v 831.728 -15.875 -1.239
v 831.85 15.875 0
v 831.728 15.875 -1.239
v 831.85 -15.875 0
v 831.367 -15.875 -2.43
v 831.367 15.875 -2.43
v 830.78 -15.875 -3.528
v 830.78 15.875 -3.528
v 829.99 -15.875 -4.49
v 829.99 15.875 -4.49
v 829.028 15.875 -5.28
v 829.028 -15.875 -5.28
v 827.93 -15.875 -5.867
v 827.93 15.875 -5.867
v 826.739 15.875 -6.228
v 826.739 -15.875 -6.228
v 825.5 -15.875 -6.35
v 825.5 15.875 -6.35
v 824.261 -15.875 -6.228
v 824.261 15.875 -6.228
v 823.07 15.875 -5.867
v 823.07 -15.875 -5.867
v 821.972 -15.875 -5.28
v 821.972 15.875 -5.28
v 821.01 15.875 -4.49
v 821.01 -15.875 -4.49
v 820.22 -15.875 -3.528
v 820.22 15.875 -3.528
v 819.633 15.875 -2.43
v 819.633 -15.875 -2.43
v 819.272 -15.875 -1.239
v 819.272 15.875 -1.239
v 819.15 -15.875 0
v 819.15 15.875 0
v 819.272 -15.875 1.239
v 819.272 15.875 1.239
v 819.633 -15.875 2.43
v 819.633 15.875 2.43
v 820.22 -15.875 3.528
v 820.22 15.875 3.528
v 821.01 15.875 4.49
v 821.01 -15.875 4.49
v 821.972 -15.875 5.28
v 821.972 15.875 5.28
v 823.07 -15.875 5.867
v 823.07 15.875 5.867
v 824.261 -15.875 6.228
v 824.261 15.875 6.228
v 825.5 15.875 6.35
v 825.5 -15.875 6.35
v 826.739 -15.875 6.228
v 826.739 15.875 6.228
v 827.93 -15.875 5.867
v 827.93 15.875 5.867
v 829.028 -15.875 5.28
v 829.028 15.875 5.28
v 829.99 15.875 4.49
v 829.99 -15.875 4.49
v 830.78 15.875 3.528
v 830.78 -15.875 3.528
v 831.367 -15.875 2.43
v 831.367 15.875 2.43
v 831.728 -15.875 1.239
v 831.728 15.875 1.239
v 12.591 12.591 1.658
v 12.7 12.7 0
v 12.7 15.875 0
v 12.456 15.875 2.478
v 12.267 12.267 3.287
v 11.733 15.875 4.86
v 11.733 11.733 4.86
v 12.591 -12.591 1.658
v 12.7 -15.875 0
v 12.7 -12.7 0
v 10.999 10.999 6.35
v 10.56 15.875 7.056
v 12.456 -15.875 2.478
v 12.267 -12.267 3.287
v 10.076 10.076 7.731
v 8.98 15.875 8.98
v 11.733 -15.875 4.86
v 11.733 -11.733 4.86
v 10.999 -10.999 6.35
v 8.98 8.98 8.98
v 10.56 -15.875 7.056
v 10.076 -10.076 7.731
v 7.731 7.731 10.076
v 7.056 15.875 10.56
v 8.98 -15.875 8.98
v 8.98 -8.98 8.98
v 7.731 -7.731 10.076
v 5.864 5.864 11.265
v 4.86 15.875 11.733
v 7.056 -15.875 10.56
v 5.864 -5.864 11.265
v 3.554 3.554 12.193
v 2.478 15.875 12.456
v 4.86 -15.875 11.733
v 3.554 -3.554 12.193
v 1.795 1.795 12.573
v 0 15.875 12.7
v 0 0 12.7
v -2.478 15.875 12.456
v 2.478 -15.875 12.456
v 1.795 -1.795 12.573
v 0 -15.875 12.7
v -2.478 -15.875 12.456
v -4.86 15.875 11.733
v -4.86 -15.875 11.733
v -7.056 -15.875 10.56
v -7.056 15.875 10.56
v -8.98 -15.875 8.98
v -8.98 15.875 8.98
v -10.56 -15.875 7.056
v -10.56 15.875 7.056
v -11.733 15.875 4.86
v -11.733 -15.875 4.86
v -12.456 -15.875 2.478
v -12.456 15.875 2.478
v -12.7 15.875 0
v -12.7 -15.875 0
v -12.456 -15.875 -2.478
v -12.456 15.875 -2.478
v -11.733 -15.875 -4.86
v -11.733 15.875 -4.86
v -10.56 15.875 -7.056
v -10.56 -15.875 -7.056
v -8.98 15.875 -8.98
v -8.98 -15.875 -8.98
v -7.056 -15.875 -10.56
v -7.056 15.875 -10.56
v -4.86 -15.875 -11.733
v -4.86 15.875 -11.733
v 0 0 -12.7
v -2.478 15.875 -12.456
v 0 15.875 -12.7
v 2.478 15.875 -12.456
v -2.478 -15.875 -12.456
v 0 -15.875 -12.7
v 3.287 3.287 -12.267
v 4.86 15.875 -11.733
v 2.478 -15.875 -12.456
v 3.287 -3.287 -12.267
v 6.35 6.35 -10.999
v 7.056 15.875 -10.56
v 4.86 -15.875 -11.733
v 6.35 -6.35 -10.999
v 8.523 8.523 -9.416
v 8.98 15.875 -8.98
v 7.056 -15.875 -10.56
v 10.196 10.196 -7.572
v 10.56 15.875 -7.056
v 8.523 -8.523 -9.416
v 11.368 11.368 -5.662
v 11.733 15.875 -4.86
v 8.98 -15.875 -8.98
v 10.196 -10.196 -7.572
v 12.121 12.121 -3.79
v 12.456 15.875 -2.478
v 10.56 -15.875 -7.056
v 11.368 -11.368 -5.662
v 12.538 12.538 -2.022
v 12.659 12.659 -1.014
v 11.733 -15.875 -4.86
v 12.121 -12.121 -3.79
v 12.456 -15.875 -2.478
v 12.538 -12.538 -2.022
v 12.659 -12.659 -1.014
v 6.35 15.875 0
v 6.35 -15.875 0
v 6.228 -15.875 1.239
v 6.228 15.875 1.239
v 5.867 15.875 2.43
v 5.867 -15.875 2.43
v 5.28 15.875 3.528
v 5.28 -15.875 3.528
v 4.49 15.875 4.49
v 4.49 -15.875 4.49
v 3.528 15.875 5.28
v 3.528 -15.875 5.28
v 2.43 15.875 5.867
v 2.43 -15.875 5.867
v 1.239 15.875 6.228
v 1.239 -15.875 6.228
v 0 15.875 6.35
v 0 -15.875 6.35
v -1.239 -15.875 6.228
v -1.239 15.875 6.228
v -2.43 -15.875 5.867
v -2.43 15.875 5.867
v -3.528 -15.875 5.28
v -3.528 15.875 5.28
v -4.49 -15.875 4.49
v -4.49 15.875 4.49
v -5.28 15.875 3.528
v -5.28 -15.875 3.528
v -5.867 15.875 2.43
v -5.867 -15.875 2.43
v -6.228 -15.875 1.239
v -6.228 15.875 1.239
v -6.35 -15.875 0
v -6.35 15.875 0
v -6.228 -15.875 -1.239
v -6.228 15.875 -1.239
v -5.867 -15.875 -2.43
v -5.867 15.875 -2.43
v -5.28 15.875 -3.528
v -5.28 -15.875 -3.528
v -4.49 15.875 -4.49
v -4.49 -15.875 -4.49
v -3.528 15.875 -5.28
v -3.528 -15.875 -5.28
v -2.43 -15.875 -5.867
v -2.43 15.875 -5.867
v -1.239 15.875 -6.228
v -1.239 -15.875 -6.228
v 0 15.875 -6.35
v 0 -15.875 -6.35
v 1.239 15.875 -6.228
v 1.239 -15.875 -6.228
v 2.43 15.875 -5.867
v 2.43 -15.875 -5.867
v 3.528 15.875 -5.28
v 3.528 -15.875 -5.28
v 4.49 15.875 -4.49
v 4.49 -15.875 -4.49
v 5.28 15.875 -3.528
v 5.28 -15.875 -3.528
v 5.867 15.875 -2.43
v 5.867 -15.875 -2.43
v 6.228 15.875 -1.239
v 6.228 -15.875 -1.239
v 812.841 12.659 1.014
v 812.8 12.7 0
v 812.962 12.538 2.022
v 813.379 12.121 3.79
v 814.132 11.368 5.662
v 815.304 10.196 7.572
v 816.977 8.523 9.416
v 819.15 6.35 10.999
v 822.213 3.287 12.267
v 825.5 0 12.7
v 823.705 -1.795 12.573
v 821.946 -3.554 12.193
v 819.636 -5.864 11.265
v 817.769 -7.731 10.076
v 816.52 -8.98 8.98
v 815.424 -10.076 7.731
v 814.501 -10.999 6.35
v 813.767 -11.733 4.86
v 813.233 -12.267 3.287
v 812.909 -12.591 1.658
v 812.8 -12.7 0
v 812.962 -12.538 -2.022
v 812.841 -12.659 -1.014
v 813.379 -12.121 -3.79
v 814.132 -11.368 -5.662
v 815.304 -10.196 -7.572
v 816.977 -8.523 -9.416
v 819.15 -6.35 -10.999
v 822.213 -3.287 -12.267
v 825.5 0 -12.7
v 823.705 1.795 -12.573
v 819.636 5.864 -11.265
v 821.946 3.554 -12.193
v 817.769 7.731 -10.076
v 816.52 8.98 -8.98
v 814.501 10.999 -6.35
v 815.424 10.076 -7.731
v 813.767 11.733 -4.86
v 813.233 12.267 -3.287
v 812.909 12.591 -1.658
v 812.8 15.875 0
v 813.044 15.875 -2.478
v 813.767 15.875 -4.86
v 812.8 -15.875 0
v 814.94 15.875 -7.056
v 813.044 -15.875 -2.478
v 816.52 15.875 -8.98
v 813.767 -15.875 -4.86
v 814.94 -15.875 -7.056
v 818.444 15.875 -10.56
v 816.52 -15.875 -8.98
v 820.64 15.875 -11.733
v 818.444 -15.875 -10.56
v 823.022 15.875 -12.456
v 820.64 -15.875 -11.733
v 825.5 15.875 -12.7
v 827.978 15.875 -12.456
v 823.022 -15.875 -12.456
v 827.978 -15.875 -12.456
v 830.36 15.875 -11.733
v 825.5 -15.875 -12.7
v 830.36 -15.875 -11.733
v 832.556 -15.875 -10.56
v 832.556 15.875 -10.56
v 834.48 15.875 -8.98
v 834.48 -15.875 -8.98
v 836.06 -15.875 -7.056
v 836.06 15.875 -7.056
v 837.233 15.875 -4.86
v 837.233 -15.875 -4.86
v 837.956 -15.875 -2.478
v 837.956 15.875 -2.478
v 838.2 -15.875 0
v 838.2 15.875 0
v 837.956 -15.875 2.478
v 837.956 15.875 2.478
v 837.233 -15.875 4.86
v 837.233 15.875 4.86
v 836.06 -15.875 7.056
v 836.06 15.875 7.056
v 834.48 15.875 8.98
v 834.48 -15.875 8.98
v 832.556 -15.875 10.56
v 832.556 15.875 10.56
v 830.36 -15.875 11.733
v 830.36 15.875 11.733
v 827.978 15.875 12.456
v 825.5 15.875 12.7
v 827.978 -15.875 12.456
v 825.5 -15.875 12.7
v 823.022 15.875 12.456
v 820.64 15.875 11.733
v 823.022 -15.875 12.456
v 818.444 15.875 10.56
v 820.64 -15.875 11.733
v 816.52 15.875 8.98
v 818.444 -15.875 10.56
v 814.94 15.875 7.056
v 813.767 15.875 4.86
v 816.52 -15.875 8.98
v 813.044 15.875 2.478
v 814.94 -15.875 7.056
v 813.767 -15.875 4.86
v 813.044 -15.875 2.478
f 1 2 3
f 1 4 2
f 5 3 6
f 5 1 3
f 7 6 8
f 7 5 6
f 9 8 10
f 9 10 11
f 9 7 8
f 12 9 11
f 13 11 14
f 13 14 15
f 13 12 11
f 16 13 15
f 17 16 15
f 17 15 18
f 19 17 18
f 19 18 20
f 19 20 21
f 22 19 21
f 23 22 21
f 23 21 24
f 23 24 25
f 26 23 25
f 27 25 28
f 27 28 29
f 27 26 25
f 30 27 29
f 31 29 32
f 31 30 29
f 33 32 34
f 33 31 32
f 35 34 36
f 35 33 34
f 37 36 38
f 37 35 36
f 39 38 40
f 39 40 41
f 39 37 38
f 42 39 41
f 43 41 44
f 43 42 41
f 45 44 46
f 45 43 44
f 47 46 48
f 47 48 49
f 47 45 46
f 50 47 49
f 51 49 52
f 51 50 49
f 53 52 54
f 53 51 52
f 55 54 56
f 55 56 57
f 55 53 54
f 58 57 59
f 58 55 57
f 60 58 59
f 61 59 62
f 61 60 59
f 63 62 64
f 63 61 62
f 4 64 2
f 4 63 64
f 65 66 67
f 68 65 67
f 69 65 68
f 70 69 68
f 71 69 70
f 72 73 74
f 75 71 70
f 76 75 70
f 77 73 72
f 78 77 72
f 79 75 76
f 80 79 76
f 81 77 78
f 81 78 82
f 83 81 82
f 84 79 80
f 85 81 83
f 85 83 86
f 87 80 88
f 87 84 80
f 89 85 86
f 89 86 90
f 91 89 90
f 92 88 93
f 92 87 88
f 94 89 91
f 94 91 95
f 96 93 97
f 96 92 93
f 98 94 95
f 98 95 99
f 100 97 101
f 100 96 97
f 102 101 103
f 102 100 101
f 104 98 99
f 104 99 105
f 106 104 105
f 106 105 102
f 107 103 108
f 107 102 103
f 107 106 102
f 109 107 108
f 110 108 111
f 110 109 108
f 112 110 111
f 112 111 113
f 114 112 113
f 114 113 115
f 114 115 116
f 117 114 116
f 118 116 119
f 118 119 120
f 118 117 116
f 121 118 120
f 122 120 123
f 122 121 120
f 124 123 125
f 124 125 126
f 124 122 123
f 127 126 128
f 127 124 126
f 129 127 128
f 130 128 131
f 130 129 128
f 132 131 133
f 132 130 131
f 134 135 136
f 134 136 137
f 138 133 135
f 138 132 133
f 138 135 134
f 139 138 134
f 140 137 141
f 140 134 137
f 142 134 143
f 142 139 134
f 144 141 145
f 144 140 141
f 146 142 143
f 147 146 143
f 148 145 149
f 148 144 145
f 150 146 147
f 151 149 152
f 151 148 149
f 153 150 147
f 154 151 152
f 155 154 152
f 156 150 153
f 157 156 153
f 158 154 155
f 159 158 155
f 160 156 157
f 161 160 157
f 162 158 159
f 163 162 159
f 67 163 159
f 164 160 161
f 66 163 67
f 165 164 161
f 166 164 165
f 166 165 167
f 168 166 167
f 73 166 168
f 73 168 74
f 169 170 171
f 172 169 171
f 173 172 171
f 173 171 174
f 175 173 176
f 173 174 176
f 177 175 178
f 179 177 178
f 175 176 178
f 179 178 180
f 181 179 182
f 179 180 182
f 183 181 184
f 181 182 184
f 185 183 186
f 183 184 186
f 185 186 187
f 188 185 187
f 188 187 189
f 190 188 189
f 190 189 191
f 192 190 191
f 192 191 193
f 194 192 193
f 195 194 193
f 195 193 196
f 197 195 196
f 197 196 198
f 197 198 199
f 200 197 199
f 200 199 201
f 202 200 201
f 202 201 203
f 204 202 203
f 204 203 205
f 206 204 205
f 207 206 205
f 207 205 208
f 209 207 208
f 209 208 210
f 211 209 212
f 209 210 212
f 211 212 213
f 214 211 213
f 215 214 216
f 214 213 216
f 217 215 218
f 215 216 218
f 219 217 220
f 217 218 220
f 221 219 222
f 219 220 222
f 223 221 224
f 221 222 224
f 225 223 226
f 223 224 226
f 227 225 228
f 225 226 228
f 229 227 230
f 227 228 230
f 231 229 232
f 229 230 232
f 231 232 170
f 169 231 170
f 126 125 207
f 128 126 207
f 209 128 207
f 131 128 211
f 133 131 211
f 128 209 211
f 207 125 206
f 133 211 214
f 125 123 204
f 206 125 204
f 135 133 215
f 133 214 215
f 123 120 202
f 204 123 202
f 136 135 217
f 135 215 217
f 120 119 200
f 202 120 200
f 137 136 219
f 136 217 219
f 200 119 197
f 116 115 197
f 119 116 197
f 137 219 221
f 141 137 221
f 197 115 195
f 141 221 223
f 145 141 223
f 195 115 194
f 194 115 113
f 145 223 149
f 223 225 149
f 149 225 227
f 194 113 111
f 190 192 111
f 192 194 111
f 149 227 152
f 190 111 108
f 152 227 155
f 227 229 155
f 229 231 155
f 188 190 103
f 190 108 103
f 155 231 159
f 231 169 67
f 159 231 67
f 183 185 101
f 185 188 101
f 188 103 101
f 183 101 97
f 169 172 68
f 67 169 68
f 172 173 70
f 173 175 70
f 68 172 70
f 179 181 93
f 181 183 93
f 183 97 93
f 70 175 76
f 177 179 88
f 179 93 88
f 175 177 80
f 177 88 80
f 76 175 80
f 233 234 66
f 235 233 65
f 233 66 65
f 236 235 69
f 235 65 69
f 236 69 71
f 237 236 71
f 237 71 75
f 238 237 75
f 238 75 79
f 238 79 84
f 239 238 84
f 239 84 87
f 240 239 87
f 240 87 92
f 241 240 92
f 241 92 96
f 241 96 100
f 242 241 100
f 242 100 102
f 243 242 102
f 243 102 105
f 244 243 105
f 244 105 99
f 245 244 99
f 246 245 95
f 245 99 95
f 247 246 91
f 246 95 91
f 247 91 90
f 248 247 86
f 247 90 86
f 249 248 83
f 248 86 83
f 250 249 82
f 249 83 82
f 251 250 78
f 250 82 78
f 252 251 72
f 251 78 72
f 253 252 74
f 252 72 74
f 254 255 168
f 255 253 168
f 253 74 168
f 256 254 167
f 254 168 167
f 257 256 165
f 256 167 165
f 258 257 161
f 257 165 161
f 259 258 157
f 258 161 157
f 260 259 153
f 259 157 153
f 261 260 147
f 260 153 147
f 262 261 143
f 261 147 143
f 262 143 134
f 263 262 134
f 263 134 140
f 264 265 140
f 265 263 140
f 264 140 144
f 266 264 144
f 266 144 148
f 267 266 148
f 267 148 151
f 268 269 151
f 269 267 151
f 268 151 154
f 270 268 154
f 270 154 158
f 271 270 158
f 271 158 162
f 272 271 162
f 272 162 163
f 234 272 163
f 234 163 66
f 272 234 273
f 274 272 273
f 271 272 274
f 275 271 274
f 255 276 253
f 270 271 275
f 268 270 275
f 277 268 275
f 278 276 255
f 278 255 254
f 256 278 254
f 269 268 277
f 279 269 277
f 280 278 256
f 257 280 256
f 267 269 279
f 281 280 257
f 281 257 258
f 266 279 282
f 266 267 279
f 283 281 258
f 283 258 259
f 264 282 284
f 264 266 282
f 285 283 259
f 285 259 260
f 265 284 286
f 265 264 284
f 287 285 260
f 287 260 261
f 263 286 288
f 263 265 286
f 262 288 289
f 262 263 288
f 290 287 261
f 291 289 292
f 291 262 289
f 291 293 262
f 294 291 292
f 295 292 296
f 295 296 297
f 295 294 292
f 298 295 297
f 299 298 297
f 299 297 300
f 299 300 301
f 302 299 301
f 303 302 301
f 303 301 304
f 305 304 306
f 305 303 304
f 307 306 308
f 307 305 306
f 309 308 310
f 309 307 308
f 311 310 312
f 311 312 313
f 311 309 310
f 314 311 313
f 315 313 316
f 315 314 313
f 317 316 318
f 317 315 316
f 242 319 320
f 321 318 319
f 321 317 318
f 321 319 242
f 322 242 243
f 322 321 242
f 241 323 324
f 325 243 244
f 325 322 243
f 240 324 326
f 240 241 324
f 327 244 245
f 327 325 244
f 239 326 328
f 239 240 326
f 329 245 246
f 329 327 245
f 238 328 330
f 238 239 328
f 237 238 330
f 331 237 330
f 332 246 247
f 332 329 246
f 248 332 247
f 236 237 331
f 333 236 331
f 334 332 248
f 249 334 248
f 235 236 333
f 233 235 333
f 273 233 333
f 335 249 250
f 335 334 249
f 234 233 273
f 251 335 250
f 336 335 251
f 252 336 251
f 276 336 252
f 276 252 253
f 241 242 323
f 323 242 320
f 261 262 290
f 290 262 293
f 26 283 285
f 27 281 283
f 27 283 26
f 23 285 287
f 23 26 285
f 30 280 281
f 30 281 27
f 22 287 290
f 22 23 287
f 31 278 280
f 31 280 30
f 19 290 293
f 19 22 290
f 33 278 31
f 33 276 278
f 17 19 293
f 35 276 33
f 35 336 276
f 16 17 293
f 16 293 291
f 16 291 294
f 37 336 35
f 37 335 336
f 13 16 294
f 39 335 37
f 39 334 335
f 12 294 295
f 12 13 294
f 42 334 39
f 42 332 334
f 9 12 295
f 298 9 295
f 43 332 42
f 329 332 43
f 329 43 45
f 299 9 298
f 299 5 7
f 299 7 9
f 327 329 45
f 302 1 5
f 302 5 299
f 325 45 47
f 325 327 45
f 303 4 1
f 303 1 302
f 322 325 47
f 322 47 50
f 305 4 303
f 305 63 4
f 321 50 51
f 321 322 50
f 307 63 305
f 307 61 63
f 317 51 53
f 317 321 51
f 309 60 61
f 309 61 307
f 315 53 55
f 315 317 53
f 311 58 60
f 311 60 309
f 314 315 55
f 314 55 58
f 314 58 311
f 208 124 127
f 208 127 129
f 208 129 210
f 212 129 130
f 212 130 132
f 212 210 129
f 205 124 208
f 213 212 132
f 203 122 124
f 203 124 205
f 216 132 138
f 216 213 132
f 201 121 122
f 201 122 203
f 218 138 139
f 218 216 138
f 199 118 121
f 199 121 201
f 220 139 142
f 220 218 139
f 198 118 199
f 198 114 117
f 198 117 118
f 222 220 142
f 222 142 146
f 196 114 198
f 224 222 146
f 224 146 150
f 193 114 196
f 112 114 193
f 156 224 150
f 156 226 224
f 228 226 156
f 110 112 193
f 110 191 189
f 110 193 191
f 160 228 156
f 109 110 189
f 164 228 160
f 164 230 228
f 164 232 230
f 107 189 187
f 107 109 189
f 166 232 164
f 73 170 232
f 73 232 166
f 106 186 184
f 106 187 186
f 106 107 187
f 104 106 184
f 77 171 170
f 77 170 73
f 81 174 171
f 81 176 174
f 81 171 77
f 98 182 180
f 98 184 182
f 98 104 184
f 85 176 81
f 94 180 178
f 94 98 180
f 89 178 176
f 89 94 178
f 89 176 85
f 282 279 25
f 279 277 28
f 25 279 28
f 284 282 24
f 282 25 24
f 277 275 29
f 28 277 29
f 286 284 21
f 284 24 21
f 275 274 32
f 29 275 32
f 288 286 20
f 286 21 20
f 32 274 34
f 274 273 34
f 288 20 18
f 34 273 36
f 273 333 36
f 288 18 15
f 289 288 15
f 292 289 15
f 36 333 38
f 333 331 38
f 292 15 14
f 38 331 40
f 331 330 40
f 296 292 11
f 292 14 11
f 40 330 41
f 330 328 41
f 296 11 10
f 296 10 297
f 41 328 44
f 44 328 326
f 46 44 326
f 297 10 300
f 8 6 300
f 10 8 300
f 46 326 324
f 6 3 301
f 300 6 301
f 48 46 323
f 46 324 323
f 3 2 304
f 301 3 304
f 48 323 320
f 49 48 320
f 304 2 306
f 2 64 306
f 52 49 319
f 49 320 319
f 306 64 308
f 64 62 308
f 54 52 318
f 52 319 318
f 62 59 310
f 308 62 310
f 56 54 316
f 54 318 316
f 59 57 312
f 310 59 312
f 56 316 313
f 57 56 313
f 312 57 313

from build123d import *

# Parameters (mm, degrees)
F1_DEPTH      = 15.875
F0_R          = 12.7
F3_END_RADIUS = 12.7
F2_R          = 12.7
F3_REACH      = 874.1220244843
F7_R          = 6.35
F8_DEPTH      = 50.8


# Not quite as in the source:
# - a feature of the source that left no trace in its solid (it failed there, or was rolled back) is left out


with BuildPart() as f1:
    # F0 (on Front) → F1 (new body, symmetric)
    with BuildSketch(Plane.XZ):
        with BuildLine():
            ThreePointArc((838.2, 0), (825.5, 12.7), (812.8, 0))
            ThreePointArc((812.8, 0), (825.5, -12.7), (838.2, 0))
        make_face()
        with BuildLine():
            ThreePointArc((819.15, 0), (825.5, 6.35), (831.85, 0))
            ThreePointArc((831.85, 0), (825.5, -6.35), (819.15, 0))
        make_face(mode=Mode.SUBTRACT)
    extrude(amount=F1_DEPTH, both=True)



with BuildPart() as f1b:
    # F0 (on Front) → F1, piece 2 (new body, symmetric)
    with BuildSketch(Plane.XZ):
        Circle(F0_R)
    extrude(amount=F1_DEPTH, both=True)


with BuildPart() as f1_1:
    add(f1.part)

    add(f1b.part)  # F3 merges F1b
    f3_end = (Plane(origin=(825.5, 7.9375, 0), x_dir=(0, 0, -1), z_dir=(0, -1, 0)) * Cylinder(F3_END_RADIUS, 3451.9858515901, mode=Mode.PRIVATE)).faces().sort_by_distance((825.5, 7.9375, 12.7))[0]
    # F2 (on Right) → F3 (join, up to the whole of a round face its end follows)
    with BuildSketch(Plane.YZ):
        Circle(F2_R)
    f3_long = extrude(amount=F3_REACH, mode=Mode.PRIVATE)
    add(split(f3_long, bisect_by=f3_end, keep=Keep.ALL, mode=Mode.PRIVATE).solids().sort_by_distance((0, 0, 0))[0])

    # F7 (on face) → F8 (cut)
    with BuildSketch(Plane.XZ.offset(15.875)):
        Circle(F7_R)
    extrude(amount=-F8_DEPTH, mode=Mode.SUBTRACT)


solid = f1_1.part
